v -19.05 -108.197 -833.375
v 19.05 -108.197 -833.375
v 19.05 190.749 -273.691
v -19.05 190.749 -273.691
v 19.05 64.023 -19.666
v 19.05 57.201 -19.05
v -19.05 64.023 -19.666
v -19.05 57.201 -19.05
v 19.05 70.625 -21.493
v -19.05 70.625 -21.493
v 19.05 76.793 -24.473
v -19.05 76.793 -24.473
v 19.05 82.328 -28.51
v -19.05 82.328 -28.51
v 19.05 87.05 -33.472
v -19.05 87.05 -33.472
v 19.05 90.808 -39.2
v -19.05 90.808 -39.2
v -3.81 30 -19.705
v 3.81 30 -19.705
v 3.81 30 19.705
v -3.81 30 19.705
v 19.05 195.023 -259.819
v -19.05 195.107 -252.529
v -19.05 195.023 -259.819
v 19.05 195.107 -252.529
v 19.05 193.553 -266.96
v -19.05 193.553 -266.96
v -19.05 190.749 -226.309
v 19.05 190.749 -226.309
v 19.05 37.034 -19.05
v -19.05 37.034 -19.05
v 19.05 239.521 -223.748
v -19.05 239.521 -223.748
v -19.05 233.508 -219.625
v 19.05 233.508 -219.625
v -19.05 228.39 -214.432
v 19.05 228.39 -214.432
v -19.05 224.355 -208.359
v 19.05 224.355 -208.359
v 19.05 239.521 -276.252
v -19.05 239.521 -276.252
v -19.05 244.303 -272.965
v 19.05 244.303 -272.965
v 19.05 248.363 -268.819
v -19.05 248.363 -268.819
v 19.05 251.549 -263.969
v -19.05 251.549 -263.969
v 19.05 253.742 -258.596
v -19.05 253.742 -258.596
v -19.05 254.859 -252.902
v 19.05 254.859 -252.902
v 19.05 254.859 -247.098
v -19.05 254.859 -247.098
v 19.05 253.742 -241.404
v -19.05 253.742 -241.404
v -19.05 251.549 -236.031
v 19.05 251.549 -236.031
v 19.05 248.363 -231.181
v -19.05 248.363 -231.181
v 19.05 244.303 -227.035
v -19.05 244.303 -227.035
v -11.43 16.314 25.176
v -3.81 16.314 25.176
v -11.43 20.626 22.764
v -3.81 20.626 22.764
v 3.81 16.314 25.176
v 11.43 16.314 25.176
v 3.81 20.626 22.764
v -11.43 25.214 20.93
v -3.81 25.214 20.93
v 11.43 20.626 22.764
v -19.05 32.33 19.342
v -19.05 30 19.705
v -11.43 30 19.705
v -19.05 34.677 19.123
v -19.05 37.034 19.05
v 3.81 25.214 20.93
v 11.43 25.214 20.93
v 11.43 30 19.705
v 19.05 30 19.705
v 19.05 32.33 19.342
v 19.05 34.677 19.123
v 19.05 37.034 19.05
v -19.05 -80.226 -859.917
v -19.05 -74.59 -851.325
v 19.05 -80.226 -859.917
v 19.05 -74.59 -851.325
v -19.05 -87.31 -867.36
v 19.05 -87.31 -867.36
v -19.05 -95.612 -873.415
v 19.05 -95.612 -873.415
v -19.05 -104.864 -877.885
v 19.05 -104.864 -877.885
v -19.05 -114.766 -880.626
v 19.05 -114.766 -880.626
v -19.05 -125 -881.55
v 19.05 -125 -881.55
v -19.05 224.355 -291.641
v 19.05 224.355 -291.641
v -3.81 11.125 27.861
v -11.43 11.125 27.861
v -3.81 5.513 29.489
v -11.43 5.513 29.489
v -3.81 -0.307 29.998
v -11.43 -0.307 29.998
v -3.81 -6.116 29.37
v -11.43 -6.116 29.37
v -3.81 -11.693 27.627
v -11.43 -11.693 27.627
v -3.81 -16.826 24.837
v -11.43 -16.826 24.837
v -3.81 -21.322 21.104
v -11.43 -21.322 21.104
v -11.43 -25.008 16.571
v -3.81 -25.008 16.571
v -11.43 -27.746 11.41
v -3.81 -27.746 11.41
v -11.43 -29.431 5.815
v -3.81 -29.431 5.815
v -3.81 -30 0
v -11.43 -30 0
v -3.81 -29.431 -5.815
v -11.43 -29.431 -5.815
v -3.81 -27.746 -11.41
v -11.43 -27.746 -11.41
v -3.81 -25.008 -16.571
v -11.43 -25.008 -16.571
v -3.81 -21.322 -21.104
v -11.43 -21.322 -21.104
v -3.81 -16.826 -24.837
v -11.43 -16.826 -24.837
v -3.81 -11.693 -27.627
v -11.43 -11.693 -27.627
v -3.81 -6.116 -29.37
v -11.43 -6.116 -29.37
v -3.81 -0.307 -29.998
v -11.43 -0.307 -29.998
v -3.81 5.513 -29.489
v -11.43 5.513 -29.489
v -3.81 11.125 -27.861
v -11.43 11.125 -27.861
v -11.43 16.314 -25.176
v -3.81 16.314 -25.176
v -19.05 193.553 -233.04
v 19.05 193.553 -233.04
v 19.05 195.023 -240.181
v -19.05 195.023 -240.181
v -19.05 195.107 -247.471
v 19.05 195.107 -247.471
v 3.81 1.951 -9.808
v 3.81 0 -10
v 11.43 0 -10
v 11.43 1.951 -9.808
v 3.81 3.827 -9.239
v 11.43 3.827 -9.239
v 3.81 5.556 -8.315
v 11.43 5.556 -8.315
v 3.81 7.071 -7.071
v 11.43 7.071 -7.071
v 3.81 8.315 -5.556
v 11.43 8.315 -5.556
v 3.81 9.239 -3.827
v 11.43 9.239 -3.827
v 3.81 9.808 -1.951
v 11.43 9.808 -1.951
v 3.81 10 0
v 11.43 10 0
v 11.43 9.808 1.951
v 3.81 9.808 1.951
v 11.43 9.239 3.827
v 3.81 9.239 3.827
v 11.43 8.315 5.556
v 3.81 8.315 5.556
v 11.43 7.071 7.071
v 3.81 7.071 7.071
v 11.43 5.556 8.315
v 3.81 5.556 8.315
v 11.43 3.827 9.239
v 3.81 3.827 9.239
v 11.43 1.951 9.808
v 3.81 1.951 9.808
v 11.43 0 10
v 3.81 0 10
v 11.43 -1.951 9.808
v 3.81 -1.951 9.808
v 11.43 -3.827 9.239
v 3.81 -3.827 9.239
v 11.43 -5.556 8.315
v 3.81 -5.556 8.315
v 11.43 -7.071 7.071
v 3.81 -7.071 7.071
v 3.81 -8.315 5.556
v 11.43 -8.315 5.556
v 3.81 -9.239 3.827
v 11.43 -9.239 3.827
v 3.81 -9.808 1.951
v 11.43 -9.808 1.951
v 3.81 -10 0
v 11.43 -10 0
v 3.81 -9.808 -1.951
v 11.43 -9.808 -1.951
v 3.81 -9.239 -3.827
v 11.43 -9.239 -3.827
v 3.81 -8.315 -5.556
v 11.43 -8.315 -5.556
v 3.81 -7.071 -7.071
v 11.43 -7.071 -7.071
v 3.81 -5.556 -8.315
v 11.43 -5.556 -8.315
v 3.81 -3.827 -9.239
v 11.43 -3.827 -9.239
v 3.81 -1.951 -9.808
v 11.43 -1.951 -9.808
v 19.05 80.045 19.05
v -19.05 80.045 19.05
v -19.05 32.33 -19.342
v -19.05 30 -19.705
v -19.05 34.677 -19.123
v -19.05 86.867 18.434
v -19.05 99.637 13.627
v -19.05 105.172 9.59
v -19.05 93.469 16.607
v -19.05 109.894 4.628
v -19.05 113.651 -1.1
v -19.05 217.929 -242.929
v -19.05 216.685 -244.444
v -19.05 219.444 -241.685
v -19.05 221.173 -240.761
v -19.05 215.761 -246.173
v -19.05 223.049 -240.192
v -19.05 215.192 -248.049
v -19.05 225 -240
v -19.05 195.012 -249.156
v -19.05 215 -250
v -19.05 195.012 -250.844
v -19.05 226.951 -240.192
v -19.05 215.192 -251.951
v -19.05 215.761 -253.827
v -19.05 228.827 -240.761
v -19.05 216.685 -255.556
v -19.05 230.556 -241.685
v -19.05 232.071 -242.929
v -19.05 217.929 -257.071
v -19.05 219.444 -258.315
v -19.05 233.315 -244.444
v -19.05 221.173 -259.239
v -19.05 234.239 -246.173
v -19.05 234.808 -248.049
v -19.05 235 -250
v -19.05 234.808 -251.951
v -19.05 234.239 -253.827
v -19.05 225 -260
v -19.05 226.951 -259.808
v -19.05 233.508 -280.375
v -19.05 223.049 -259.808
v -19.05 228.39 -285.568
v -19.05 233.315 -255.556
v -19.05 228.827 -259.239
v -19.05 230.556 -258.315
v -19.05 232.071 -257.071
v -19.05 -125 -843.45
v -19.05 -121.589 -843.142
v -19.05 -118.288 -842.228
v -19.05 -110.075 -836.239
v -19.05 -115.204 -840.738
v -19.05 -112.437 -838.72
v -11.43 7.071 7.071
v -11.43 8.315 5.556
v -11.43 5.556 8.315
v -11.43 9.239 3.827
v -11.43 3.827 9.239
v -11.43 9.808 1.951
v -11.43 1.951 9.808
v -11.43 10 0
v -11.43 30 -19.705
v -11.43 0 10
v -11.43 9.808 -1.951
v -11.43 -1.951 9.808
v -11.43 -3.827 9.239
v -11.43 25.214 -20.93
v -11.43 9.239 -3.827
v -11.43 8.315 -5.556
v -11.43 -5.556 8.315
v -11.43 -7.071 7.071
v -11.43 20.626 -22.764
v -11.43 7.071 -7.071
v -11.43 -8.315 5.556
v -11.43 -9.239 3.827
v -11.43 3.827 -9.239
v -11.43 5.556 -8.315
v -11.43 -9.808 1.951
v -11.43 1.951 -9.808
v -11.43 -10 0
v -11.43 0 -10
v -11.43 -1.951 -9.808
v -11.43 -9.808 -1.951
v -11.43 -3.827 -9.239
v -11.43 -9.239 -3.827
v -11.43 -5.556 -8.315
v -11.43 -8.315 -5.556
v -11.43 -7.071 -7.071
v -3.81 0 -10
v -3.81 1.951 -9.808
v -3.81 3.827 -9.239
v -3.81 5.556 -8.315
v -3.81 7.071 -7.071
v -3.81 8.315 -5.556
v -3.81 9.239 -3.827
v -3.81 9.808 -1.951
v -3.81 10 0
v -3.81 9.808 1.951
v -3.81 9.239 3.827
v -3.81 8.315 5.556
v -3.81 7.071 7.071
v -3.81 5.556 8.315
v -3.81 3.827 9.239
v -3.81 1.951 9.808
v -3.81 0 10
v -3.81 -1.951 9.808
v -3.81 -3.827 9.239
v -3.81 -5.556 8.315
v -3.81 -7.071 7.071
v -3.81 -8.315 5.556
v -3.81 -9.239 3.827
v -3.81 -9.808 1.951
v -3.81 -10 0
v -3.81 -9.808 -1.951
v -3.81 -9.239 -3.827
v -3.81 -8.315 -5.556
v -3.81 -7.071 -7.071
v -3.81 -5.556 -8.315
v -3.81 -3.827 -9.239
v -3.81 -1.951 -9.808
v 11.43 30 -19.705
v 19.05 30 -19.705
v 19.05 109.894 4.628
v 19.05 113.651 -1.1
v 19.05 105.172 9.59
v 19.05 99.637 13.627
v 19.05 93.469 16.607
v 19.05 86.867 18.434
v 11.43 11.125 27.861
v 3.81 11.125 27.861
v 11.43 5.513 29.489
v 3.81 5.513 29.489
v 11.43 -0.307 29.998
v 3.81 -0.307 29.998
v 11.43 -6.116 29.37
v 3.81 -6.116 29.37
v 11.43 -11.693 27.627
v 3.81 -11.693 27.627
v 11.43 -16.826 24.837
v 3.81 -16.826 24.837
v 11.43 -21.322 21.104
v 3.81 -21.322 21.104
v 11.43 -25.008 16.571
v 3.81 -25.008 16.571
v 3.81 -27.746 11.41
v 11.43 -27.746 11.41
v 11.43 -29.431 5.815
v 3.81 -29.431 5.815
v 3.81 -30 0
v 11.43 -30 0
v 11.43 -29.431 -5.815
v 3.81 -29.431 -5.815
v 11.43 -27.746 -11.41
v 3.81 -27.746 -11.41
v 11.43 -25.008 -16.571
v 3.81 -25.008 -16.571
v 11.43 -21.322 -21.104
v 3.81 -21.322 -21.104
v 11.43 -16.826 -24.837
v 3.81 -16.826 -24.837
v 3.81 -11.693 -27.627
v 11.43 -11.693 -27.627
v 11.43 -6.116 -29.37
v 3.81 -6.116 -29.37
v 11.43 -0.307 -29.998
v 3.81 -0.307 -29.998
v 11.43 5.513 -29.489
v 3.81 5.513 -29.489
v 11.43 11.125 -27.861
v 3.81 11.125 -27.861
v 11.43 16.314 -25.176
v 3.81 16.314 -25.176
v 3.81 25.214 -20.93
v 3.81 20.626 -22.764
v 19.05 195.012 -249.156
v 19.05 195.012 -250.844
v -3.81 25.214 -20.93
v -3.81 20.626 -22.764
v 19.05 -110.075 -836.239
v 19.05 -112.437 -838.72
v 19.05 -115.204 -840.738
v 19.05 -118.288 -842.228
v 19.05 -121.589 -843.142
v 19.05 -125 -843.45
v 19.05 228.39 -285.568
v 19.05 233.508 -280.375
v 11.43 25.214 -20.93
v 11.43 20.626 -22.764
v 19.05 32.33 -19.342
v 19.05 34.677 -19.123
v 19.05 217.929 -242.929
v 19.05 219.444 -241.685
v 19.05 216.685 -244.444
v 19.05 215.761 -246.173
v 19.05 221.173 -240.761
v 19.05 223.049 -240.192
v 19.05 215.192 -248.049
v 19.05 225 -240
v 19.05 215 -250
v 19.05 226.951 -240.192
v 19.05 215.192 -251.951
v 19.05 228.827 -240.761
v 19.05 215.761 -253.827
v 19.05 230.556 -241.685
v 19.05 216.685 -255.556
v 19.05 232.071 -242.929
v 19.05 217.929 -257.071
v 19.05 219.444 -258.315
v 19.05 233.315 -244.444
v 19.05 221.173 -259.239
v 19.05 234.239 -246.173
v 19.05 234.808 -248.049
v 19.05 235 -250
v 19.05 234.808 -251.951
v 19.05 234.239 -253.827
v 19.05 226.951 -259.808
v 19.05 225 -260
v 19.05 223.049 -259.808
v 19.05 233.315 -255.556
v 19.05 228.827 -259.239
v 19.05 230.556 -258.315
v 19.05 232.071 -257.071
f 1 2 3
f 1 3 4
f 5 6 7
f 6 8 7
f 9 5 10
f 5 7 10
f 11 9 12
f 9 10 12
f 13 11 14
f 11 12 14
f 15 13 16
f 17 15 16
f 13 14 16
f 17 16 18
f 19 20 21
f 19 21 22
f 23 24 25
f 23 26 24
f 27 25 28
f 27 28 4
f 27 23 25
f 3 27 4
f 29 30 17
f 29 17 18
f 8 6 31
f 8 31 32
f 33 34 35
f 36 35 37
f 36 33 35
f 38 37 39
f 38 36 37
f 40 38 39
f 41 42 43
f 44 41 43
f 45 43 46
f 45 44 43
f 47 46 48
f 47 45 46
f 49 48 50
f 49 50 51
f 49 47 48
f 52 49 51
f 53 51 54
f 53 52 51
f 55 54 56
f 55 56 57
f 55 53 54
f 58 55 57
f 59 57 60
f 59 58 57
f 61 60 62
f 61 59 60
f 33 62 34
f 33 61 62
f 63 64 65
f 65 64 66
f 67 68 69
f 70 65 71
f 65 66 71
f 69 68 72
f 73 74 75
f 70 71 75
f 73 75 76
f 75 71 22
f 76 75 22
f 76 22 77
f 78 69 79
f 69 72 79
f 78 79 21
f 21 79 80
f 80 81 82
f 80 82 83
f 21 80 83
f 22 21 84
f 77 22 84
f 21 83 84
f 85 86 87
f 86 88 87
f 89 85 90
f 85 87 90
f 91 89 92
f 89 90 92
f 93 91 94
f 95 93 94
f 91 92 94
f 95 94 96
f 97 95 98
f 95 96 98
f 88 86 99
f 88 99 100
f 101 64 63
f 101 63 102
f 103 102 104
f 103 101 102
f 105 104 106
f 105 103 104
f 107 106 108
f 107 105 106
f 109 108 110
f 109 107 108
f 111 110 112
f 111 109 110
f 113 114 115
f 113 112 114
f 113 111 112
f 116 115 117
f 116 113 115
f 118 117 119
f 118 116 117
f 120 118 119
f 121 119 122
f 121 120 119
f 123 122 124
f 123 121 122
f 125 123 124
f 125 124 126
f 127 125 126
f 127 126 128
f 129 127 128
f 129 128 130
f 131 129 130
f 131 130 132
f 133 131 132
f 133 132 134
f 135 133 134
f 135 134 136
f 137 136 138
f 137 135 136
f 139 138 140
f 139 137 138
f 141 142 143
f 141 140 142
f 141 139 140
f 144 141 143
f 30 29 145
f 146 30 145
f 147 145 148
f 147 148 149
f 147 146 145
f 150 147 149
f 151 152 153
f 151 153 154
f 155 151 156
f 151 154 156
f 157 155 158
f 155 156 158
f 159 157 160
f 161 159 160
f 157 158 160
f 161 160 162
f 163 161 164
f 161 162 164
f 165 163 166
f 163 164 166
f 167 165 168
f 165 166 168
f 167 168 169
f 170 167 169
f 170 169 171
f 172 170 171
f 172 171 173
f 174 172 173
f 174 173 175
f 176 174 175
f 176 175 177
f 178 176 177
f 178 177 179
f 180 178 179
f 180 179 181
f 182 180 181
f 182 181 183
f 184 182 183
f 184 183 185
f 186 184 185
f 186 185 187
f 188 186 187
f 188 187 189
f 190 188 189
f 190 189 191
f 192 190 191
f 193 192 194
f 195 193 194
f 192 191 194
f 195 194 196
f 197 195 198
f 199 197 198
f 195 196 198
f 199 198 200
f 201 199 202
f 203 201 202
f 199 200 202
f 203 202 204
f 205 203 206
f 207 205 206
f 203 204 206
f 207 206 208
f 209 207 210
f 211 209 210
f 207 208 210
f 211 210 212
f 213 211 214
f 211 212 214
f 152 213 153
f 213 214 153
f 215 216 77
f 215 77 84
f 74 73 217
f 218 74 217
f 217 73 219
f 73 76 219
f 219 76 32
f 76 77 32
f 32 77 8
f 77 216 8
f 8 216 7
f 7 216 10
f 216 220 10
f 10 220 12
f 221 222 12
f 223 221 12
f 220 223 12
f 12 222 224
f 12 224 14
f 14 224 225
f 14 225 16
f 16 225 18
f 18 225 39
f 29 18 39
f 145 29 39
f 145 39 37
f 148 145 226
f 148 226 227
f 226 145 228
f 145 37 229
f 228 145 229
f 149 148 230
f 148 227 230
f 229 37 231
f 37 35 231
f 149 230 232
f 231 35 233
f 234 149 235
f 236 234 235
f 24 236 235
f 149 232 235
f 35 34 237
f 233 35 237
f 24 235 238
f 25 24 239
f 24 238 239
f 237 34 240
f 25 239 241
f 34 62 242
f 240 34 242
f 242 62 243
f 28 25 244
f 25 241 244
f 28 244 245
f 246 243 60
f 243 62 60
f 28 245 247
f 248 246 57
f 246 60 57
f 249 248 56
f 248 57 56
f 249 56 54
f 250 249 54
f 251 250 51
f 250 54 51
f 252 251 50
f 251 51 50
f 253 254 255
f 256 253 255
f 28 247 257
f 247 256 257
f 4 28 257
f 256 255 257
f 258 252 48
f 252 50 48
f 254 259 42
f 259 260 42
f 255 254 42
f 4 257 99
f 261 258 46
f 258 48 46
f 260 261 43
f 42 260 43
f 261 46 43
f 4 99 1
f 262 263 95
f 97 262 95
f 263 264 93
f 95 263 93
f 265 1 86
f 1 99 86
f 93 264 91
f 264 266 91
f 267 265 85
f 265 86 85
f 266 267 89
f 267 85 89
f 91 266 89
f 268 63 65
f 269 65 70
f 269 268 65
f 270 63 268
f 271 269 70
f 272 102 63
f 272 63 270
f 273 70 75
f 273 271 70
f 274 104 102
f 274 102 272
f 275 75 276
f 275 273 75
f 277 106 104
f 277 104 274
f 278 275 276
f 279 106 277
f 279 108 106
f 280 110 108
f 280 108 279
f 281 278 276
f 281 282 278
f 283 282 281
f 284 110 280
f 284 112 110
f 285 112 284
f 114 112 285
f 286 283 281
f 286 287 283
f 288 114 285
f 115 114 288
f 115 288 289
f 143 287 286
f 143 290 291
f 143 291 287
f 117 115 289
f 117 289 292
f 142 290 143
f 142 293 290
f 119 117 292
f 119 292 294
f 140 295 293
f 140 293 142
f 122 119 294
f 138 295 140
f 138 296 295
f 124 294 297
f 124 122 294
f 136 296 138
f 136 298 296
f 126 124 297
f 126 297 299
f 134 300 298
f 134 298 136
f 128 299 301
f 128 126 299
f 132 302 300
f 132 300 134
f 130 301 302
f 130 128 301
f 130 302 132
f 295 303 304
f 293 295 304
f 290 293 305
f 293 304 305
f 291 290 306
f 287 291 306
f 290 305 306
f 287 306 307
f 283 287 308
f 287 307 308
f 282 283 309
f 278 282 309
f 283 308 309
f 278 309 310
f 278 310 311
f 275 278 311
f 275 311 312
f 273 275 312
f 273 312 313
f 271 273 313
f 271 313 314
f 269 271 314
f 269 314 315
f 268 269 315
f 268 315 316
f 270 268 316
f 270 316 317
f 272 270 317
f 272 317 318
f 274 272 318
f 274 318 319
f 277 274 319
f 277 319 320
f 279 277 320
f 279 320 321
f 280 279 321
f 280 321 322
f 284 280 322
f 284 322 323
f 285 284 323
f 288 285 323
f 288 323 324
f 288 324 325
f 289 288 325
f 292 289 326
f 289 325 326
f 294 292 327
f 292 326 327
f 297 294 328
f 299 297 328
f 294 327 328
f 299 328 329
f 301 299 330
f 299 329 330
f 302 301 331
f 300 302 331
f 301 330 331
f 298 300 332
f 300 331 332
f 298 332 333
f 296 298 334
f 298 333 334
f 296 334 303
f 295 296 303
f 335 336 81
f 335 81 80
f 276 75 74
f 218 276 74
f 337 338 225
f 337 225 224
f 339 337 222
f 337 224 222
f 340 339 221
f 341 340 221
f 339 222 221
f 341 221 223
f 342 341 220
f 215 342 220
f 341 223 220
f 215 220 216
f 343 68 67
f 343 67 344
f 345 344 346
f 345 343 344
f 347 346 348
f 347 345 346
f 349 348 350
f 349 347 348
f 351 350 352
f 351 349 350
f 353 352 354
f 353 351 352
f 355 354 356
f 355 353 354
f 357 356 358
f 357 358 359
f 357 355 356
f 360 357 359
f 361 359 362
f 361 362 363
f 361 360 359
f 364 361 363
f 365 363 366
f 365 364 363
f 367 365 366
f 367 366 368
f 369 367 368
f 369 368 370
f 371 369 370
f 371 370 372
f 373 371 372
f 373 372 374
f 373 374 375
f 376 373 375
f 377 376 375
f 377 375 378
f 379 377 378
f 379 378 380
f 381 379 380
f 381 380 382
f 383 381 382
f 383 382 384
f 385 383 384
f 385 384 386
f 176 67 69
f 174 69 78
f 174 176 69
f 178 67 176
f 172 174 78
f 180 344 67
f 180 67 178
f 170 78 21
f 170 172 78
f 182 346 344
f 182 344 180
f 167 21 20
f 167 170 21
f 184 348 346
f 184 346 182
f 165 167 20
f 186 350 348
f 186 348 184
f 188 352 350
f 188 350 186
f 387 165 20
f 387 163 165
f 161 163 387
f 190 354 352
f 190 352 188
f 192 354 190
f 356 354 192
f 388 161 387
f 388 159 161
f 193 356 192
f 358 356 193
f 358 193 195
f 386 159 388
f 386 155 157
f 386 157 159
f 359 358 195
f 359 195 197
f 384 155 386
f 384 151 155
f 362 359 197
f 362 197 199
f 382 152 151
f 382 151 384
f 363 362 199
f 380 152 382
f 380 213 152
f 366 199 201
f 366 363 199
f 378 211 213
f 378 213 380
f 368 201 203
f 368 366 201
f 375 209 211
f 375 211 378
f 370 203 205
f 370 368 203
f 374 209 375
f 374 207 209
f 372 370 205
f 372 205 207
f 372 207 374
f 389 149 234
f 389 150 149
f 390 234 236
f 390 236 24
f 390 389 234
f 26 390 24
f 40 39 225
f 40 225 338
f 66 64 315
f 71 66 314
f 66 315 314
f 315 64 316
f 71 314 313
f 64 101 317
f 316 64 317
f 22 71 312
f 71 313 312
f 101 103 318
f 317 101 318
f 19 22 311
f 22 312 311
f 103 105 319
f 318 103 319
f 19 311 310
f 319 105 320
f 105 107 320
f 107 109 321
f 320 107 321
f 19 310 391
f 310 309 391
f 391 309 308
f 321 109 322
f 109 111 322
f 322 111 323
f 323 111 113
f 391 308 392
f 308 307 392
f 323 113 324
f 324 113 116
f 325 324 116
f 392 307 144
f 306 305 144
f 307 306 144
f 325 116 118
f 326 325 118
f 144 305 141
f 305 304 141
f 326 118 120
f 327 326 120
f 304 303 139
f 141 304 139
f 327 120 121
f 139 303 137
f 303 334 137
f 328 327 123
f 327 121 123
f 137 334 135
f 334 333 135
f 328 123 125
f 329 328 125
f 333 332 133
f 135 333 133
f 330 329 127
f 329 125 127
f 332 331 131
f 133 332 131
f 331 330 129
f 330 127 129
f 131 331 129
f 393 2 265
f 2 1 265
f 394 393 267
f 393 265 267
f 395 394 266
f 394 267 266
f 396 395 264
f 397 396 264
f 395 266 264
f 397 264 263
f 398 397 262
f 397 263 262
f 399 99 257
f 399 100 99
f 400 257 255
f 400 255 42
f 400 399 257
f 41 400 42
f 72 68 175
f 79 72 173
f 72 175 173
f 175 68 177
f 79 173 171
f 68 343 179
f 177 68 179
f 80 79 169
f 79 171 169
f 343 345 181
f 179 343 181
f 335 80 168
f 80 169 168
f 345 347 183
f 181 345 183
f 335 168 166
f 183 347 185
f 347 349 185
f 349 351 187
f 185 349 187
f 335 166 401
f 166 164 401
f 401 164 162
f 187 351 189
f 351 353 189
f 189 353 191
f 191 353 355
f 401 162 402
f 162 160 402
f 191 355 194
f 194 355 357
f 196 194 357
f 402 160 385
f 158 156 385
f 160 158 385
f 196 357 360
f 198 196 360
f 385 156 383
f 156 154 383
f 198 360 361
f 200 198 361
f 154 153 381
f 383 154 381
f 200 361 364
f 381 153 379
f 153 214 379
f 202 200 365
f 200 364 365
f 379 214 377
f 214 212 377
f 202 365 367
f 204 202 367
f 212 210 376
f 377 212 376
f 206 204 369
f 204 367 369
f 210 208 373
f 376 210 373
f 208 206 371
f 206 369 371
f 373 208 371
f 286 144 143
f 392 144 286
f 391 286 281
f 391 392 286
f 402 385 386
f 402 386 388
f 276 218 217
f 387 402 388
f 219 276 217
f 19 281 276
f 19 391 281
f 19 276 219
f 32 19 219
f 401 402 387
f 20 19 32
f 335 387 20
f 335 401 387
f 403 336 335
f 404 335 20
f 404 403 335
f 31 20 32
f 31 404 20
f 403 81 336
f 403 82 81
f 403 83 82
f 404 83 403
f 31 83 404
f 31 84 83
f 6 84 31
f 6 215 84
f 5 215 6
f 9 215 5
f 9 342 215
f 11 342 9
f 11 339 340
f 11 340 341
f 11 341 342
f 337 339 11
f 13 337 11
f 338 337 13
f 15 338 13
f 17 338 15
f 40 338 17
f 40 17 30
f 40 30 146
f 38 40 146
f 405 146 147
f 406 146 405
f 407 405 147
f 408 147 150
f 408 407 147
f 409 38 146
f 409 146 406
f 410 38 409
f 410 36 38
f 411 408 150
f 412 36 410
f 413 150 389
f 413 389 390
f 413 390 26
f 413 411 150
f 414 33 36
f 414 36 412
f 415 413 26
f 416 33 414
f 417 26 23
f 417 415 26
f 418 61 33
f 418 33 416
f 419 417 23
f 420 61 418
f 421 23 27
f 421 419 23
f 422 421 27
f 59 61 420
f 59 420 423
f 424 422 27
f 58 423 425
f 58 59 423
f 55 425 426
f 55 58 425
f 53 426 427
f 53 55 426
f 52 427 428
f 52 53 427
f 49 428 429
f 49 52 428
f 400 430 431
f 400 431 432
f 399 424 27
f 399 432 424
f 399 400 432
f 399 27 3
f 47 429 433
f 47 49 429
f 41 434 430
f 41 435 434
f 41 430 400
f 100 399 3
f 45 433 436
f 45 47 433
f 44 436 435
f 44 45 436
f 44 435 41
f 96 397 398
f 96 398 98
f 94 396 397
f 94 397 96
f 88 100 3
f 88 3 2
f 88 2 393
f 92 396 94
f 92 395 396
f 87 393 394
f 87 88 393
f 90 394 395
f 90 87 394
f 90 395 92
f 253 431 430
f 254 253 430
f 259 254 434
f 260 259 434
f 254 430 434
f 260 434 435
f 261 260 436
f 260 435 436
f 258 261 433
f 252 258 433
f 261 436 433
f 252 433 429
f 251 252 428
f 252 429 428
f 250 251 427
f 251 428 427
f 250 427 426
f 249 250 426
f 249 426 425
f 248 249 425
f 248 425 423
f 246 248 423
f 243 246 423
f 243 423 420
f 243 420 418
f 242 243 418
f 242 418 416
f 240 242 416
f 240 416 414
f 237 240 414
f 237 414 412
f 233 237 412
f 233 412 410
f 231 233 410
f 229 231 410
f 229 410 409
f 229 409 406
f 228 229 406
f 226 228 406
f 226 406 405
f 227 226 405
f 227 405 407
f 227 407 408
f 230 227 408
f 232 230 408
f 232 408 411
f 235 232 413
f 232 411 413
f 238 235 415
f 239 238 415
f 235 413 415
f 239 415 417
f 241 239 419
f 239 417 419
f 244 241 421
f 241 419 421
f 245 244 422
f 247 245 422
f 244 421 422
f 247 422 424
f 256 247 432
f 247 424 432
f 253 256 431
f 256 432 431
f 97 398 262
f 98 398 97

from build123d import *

# Parameters (mm, degrees)
SKETCH3_W           = 38.1
SKETCH3_H           = 38.1
SKETCH4_R           = 10
CUT_EXTRUDE1_DEPTH  = 917.183483622
SKETCH5_R           = 30
SKETCH5_R_2         = 10
BOSS_EXTRUDE1_DEPTH = 38.1
FILLET1_R           = 38.1
SKETCH6_W           = 7.62
SKETCH6_H           = 80.541178389
CUT_EXTRUDE2_DEPTH  = 60


with BuildPart() as part:
    # Sweep1: sweep along a path in Sketch1
    with BuildLine(Plane(origin=(0, 0, 0), x_dir=(0, 0, -1), z_dir=(1, 0, 0))) as sweep1_path:
        Line((0, 0), (0, 91.466893968))
        Line((0, 91.466893968), (250, 225))
        Line((250, 225), (842.350315886, -91.393510157))
        ThreePointArc((842.350315886, -91.393510157), (857.076574448, -105.407871929), (862.5, -125))
    # Sketch3 → Sweep1 (sweep)
    with BuildSketch(Plane(origin=(0, 0, 0), x_dir=(1, 0, 0), z_dir=(0, 1, 0))):
        Rectangle(SKETCH3_W, SKETCH3_H)
    sweep(path=sweep1_path.line, transition=Transition.RIGHT)

    # Sketch4 → Cut-Extrude1 (cut, through all)
    with BuildSketch(Plane(origin=(19.05, 0, 0), x_dir=(0, 0, -1), z_dir=(1, 0, 0))):
        Circle(SKETCH4_R)
        with Locations((250, 225)):
            Circle(SKETCH4_R)
    extrude(amount=-CUT_EXTRUDE1_DEPTH, mode=Mode.SUBTRACT)

    # Sketch5 → Boss-Extrude1 (add)
    # profile 1 of 2: a face of its own
    with BuildSketch(Plane(origin=(19.05, 0, 0), x_dir=(0, 0, -1), z_dir=(1, 0, 0))):
        Circle(SKETCH5_R)
        Circle(SKETCH5_R_2, mode=Mode.SUBTRACT)
    # profile 2 of 2: a face of its own
    with BuildSketch(Plane(origin=(19.05, 0, 0), x_dir=(0, 0, -1), z_dir=(1, 0, 0))):
        with Locations((250, 225)):
            Circle(SKETCH5_R)
        with Locations((250, 225)):
            Circle(SKETCH5_R_2, mode=Mode.SUBTRACT)
    extrude(amount=-BOSS_EXTRUDE1_DEPTH)

    # Fillet1
    fillet1_edges = [part.edges().sort_by_distance(p)[0] for p in [
        (0, 230.884475737, -279.417221917),
        (0, 197.277985894, -261.46690603),
        (0, 80.044948857, -19.05),
        (0, 102.888839079, 19.05),
        (0, 23.175364075, 19.05),
        (0, 23.175364075, -19.05),
        (0, 230.884475737, -220.582778083),
        (0, 197.277985894, -238.53309397),
    ]]
    fillet(fillet1_edges, radius=FILLET1_R)

    # Sketch6 → Cut-Extrude2 (cut)
    with BuildSketch(Plane(origin=(0, -30, 0), x_dir=(-1, 0, 0), z_dir=(0, -1, 0))):
        with Locations((-15.24, -3.428675544)):
            Rectangle(SKETCH6_W, SKETCH6_H)
        with Locations((0, -3.428675544)):
            Rectangle(SKETCH6_W, SKETCH6_H)
        with Locations((15.24, -3.428675544)):
            Rectangle(SKETCH6_W, SKETCH6_H)
    extrude(amount=-CUT_EXTRUDE2_DEPTH, mode=Mode.SUBTRACT)


solid = part.part
